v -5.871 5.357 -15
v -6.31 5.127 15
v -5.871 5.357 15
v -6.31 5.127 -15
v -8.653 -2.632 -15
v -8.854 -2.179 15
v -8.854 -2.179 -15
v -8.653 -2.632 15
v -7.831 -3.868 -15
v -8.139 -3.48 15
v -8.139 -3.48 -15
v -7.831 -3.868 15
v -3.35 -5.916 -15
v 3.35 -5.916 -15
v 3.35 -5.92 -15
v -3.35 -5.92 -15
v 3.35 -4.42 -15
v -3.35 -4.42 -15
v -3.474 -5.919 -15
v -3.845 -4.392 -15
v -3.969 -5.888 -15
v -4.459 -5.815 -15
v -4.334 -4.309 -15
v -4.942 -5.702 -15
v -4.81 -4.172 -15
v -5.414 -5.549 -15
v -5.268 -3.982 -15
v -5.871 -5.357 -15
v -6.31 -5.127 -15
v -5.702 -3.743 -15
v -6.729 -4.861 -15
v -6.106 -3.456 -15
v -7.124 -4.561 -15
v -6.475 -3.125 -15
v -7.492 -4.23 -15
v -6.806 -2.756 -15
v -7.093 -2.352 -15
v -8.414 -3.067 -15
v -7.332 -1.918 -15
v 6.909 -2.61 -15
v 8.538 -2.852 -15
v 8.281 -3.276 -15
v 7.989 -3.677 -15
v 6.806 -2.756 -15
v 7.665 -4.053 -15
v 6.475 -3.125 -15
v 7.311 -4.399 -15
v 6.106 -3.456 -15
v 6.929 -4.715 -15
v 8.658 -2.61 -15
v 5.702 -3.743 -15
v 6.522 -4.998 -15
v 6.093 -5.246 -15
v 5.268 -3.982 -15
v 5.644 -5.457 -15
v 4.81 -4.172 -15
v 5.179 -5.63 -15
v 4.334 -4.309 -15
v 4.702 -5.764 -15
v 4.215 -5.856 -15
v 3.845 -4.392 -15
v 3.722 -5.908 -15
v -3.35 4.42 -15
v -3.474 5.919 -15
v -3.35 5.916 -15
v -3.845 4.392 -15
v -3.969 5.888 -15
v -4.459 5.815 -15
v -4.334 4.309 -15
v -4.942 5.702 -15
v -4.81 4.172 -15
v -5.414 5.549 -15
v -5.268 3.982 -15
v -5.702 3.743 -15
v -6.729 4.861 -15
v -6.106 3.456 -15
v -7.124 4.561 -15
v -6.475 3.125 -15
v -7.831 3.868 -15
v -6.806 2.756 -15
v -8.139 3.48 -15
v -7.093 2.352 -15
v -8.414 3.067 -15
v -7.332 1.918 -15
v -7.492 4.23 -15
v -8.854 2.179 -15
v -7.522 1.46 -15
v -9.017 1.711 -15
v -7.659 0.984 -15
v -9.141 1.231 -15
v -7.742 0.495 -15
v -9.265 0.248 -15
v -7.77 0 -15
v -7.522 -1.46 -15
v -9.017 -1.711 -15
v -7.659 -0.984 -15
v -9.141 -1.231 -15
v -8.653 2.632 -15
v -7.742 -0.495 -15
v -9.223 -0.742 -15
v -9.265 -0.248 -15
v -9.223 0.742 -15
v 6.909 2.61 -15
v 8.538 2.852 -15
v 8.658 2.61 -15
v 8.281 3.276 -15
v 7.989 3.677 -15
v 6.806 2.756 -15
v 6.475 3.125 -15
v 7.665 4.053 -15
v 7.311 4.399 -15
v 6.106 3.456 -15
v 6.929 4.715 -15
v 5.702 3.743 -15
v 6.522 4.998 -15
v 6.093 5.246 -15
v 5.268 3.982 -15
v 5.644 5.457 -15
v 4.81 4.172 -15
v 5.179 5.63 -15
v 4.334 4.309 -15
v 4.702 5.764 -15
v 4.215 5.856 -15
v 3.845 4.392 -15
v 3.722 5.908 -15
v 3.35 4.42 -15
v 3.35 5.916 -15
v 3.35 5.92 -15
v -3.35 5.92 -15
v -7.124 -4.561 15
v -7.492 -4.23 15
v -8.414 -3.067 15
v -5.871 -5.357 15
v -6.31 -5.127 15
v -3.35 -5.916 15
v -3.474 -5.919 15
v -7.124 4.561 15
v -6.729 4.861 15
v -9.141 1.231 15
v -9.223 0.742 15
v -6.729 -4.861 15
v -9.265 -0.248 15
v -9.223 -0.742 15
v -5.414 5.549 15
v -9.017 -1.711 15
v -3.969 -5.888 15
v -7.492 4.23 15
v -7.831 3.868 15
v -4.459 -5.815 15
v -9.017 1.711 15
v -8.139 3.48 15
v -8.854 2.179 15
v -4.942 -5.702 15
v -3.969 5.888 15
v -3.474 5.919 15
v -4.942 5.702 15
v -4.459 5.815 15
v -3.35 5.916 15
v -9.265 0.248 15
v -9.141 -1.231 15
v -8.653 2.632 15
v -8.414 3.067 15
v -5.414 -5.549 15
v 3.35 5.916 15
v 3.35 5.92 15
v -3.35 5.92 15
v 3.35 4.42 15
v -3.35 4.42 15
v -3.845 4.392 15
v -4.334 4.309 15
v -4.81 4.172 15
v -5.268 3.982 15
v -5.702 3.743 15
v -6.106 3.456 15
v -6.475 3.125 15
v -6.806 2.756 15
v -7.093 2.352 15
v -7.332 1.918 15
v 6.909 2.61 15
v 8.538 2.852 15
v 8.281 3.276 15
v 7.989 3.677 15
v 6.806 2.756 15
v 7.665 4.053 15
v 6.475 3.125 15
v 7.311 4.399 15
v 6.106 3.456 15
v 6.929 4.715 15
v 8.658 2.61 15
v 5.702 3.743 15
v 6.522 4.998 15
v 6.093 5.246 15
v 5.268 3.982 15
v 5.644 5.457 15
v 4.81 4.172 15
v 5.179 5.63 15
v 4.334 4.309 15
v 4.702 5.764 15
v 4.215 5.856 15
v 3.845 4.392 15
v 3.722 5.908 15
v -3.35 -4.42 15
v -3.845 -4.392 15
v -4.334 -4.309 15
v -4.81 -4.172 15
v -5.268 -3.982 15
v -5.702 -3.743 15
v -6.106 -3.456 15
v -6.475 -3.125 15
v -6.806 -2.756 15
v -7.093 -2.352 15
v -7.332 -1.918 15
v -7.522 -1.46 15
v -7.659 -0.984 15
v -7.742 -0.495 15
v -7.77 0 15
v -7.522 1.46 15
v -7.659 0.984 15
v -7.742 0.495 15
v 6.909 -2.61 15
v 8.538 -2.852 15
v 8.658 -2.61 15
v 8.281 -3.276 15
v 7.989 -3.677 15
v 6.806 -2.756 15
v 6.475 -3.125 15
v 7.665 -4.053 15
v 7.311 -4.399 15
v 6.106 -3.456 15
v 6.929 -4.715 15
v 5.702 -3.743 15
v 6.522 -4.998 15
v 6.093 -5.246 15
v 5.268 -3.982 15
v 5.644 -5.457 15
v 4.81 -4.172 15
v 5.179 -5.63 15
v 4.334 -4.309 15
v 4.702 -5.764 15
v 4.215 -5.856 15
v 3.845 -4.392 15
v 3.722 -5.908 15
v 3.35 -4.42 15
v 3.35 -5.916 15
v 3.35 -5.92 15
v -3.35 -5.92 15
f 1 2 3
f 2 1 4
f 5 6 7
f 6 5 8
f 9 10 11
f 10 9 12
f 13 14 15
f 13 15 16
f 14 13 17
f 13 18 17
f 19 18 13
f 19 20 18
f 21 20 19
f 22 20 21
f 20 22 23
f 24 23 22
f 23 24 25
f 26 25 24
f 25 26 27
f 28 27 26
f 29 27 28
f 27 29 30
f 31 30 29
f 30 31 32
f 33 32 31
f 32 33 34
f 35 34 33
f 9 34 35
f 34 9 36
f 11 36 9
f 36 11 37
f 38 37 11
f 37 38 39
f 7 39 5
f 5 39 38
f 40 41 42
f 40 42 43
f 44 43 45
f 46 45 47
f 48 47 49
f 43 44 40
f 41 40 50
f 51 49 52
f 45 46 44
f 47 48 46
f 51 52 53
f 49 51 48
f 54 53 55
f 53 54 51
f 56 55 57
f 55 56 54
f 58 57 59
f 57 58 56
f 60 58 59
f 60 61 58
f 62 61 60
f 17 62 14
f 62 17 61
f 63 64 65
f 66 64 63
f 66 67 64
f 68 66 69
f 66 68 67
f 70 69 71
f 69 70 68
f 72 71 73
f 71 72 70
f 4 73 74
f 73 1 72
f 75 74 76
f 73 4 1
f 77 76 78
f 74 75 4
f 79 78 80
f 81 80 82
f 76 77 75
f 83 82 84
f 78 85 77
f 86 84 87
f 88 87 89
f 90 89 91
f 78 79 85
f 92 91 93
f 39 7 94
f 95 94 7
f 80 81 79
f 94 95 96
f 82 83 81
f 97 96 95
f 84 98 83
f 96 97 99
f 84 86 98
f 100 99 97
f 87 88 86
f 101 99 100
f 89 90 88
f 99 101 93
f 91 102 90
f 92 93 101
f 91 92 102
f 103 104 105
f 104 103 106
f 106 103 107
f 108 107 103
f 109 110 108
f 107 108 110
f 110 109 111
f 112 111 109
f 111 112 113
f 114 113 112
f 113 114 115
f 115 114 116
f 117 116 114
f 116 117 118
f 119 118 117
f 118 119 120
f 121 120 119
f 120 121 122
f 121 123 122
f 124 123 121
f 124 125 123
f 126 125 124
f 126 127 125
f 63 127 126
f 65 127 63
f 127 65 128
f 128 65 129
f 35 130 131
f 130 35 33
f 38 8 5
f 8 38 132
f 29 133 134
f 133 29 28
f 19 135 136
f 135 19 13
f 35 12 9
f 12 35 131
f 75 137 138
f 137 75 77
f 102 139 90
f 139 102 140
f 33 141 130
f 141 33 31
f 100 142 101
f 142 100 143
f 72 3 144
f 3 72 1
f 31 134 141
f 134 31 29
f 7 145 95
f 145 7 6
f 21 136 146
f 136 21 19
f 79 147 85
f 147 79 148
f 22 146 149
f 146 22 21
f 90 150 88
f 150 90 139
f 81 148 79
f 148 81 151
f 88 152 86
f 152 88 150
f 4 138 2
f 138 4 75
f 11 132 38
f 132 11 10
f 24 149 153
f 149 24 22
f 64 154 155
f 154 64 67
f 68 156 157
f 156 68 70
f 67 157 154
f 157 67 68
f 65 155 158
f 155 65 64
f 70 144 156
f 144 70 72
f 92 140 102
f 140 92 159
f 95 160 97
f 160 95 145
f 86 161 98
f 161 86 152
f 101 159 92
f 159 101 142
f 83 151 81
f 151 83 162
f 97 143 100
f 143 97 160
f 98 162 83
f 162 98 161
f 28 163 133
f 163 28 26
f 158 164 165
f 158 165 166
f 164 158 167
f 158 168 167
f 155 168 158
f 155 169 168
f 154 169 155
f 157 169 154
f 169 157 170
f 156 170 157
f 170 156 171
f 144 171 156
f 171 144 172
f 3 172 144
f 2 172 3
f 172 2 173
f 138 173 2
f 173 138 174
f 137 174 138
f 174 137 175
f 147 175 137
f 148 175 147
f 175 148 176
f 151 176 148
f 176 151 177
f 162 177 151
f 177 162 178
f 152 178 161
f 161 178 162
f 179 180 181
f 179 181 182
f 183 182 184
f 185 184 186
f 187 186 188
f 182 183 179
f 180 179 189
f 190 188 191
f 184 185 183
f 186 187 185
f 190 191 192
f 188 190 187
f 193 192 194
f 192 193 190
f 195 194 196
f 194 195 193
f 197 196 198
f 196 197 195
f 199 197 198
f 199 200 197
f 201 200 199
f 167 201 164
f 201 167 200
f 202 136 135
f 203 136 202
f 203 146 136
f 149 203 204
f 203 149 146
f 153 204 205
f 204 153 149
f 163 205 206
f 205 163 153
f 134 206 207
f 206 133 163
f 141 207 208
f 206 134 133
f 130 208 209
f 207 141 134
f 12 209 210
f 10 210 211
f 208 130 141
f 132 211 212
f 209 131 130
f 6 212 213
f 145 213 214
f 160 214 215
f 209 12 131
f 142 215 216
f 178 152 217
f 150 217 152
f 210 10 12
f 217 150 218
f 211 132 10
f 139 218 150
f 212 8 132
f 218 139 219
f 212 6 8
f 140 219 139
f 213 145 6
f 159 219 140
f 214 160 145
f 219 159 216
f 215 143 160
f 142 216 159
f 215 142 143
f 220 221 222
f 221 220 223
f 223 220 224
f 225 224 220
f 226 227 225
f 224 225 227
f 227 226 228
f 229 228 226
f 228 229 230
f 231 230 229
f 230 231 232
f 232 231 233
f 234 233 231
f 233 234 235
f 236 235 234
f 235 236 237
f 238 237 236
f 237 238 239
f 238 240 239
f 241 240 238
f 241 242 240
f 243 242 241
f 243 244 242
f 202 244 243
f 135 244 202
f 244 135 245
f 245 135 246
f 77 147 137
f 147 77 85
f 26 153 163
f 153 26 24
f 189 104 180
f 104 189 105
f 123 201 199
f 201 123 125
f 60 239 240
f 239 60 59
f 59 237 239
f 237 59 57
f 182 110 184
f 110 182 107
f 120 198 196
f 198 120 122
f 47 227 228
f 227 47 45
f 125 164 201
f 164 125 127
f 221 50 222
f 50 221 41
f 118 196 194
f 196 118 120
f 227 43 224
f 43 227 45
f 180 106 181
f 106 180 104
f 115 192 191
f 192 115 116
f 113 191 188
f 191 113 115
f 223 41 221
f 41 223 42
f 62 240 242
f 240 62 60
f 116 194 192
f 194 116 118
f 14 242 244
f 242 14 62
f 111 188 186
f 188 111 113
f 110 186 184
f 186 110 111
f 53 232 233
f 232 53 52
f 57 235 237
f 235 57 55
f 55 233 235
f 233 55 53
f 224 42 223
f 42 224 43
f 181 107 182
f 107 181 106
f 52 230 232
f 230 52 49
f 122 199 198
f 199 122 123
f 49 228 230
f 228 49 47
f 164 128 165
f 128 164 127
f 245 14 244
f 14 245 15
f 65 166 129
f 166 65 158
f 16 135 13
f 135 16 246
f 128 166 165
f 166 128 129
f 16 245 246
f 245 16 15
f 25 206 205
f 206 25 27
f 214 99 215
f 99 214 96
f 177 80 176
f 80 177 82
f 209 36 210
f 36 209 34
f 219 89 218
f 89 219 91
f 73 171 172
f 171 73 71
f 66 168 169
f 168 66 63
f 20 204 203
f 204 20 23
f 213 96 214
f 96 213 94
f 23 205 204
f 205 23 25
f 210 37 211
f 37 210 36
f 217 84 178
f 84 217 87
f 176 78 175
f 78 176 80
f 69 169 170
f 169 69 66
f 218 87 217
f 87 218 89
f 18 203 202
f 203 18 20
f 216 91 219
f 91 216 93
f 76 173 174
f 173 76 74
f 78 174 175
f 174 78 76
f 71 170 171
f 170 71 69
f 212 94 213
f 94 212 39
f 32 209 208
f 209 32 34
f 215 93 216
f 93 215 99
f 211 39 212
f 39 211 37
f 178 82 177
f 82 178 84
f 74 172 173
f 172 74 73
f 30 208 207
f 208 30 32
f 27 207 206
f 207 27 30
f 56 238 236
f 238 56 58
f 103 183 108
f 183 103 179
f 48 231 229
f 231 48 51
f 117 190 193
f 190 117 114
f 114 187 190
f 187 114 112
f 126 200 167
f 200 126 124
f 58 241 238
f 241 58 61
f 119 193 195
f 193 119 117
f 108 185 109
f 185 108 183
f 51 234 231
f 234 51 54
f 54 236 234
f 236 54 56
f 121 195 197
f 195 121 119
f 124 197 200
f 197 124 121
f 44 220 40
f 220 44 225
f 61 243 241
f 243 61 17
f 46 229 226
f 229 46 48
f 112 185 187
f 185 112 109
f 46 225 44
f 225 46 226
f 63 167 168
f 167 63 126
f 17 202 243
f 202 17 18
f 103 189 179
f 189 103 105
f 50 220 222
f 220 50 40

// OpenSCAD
// file: regazza_mast_constants.scad
mast_height = 40;

// Mast
mast_exterior_diameter = 8.84;
mast_interior_diameter = 6.94;
mast_interior_circle_center_distance = 6.7;

$fa=1;
$fs=0.5;

// Sail Bolt Rope Track
bolt_rope_inner = 3.32;
bolt_rope_outer = bolt_rope_inner + 1.9;
// main file
include <regazza_mast_constants.scad>

// include <regazza_mast.scad>
$fa = 1;
$fs = 0.5;

height = 30;
thickness = 3;

difference(){
    // Outside of shell
    union(){
        // Outer radius 1
        translate([-mast_interior_circle_center_distance/2, 0, 0]) cylinder(height, d=mast_exterior_diameter + thickness, center=true);
        // Outer radius 2
        translate([mast_interior_circle_center_distance/2, 0, 0]) cylinder(height, d=mast_exterior_diameter + thickness, center=true);
        // Joiner
        cube([mast_interior_circle_center_distance, mast_exterior_diameter + thickness, height], center=true);
    }

    // Inside of shell
    translate([0, 0, -0.1]) scale([1, 1, 1.1]) union(){
        // Outer radius 1
        translate([-mast_interior_circle_center_distance/2, 0, 0]) cylinder(height, d=mast_exterior_diameter, center=true);
        // Outer radius 2
        translate([mast_interior_circle_center_distance/2, 0, 0]) cylinder(height, d=mast_exterior_diameter, center=true);
        // Joiner
        cube([mast_interior_circle_center_distance, mast_exterior_diameter, height], center=true);
    }
    
    translate([mast_interior_circle_center_distance/2 + mast_exterior_diameter/2, 0, 0]) cube([mast_interior_circle_center_distance, bolt_rope_outer, height+2], center=true);

}
